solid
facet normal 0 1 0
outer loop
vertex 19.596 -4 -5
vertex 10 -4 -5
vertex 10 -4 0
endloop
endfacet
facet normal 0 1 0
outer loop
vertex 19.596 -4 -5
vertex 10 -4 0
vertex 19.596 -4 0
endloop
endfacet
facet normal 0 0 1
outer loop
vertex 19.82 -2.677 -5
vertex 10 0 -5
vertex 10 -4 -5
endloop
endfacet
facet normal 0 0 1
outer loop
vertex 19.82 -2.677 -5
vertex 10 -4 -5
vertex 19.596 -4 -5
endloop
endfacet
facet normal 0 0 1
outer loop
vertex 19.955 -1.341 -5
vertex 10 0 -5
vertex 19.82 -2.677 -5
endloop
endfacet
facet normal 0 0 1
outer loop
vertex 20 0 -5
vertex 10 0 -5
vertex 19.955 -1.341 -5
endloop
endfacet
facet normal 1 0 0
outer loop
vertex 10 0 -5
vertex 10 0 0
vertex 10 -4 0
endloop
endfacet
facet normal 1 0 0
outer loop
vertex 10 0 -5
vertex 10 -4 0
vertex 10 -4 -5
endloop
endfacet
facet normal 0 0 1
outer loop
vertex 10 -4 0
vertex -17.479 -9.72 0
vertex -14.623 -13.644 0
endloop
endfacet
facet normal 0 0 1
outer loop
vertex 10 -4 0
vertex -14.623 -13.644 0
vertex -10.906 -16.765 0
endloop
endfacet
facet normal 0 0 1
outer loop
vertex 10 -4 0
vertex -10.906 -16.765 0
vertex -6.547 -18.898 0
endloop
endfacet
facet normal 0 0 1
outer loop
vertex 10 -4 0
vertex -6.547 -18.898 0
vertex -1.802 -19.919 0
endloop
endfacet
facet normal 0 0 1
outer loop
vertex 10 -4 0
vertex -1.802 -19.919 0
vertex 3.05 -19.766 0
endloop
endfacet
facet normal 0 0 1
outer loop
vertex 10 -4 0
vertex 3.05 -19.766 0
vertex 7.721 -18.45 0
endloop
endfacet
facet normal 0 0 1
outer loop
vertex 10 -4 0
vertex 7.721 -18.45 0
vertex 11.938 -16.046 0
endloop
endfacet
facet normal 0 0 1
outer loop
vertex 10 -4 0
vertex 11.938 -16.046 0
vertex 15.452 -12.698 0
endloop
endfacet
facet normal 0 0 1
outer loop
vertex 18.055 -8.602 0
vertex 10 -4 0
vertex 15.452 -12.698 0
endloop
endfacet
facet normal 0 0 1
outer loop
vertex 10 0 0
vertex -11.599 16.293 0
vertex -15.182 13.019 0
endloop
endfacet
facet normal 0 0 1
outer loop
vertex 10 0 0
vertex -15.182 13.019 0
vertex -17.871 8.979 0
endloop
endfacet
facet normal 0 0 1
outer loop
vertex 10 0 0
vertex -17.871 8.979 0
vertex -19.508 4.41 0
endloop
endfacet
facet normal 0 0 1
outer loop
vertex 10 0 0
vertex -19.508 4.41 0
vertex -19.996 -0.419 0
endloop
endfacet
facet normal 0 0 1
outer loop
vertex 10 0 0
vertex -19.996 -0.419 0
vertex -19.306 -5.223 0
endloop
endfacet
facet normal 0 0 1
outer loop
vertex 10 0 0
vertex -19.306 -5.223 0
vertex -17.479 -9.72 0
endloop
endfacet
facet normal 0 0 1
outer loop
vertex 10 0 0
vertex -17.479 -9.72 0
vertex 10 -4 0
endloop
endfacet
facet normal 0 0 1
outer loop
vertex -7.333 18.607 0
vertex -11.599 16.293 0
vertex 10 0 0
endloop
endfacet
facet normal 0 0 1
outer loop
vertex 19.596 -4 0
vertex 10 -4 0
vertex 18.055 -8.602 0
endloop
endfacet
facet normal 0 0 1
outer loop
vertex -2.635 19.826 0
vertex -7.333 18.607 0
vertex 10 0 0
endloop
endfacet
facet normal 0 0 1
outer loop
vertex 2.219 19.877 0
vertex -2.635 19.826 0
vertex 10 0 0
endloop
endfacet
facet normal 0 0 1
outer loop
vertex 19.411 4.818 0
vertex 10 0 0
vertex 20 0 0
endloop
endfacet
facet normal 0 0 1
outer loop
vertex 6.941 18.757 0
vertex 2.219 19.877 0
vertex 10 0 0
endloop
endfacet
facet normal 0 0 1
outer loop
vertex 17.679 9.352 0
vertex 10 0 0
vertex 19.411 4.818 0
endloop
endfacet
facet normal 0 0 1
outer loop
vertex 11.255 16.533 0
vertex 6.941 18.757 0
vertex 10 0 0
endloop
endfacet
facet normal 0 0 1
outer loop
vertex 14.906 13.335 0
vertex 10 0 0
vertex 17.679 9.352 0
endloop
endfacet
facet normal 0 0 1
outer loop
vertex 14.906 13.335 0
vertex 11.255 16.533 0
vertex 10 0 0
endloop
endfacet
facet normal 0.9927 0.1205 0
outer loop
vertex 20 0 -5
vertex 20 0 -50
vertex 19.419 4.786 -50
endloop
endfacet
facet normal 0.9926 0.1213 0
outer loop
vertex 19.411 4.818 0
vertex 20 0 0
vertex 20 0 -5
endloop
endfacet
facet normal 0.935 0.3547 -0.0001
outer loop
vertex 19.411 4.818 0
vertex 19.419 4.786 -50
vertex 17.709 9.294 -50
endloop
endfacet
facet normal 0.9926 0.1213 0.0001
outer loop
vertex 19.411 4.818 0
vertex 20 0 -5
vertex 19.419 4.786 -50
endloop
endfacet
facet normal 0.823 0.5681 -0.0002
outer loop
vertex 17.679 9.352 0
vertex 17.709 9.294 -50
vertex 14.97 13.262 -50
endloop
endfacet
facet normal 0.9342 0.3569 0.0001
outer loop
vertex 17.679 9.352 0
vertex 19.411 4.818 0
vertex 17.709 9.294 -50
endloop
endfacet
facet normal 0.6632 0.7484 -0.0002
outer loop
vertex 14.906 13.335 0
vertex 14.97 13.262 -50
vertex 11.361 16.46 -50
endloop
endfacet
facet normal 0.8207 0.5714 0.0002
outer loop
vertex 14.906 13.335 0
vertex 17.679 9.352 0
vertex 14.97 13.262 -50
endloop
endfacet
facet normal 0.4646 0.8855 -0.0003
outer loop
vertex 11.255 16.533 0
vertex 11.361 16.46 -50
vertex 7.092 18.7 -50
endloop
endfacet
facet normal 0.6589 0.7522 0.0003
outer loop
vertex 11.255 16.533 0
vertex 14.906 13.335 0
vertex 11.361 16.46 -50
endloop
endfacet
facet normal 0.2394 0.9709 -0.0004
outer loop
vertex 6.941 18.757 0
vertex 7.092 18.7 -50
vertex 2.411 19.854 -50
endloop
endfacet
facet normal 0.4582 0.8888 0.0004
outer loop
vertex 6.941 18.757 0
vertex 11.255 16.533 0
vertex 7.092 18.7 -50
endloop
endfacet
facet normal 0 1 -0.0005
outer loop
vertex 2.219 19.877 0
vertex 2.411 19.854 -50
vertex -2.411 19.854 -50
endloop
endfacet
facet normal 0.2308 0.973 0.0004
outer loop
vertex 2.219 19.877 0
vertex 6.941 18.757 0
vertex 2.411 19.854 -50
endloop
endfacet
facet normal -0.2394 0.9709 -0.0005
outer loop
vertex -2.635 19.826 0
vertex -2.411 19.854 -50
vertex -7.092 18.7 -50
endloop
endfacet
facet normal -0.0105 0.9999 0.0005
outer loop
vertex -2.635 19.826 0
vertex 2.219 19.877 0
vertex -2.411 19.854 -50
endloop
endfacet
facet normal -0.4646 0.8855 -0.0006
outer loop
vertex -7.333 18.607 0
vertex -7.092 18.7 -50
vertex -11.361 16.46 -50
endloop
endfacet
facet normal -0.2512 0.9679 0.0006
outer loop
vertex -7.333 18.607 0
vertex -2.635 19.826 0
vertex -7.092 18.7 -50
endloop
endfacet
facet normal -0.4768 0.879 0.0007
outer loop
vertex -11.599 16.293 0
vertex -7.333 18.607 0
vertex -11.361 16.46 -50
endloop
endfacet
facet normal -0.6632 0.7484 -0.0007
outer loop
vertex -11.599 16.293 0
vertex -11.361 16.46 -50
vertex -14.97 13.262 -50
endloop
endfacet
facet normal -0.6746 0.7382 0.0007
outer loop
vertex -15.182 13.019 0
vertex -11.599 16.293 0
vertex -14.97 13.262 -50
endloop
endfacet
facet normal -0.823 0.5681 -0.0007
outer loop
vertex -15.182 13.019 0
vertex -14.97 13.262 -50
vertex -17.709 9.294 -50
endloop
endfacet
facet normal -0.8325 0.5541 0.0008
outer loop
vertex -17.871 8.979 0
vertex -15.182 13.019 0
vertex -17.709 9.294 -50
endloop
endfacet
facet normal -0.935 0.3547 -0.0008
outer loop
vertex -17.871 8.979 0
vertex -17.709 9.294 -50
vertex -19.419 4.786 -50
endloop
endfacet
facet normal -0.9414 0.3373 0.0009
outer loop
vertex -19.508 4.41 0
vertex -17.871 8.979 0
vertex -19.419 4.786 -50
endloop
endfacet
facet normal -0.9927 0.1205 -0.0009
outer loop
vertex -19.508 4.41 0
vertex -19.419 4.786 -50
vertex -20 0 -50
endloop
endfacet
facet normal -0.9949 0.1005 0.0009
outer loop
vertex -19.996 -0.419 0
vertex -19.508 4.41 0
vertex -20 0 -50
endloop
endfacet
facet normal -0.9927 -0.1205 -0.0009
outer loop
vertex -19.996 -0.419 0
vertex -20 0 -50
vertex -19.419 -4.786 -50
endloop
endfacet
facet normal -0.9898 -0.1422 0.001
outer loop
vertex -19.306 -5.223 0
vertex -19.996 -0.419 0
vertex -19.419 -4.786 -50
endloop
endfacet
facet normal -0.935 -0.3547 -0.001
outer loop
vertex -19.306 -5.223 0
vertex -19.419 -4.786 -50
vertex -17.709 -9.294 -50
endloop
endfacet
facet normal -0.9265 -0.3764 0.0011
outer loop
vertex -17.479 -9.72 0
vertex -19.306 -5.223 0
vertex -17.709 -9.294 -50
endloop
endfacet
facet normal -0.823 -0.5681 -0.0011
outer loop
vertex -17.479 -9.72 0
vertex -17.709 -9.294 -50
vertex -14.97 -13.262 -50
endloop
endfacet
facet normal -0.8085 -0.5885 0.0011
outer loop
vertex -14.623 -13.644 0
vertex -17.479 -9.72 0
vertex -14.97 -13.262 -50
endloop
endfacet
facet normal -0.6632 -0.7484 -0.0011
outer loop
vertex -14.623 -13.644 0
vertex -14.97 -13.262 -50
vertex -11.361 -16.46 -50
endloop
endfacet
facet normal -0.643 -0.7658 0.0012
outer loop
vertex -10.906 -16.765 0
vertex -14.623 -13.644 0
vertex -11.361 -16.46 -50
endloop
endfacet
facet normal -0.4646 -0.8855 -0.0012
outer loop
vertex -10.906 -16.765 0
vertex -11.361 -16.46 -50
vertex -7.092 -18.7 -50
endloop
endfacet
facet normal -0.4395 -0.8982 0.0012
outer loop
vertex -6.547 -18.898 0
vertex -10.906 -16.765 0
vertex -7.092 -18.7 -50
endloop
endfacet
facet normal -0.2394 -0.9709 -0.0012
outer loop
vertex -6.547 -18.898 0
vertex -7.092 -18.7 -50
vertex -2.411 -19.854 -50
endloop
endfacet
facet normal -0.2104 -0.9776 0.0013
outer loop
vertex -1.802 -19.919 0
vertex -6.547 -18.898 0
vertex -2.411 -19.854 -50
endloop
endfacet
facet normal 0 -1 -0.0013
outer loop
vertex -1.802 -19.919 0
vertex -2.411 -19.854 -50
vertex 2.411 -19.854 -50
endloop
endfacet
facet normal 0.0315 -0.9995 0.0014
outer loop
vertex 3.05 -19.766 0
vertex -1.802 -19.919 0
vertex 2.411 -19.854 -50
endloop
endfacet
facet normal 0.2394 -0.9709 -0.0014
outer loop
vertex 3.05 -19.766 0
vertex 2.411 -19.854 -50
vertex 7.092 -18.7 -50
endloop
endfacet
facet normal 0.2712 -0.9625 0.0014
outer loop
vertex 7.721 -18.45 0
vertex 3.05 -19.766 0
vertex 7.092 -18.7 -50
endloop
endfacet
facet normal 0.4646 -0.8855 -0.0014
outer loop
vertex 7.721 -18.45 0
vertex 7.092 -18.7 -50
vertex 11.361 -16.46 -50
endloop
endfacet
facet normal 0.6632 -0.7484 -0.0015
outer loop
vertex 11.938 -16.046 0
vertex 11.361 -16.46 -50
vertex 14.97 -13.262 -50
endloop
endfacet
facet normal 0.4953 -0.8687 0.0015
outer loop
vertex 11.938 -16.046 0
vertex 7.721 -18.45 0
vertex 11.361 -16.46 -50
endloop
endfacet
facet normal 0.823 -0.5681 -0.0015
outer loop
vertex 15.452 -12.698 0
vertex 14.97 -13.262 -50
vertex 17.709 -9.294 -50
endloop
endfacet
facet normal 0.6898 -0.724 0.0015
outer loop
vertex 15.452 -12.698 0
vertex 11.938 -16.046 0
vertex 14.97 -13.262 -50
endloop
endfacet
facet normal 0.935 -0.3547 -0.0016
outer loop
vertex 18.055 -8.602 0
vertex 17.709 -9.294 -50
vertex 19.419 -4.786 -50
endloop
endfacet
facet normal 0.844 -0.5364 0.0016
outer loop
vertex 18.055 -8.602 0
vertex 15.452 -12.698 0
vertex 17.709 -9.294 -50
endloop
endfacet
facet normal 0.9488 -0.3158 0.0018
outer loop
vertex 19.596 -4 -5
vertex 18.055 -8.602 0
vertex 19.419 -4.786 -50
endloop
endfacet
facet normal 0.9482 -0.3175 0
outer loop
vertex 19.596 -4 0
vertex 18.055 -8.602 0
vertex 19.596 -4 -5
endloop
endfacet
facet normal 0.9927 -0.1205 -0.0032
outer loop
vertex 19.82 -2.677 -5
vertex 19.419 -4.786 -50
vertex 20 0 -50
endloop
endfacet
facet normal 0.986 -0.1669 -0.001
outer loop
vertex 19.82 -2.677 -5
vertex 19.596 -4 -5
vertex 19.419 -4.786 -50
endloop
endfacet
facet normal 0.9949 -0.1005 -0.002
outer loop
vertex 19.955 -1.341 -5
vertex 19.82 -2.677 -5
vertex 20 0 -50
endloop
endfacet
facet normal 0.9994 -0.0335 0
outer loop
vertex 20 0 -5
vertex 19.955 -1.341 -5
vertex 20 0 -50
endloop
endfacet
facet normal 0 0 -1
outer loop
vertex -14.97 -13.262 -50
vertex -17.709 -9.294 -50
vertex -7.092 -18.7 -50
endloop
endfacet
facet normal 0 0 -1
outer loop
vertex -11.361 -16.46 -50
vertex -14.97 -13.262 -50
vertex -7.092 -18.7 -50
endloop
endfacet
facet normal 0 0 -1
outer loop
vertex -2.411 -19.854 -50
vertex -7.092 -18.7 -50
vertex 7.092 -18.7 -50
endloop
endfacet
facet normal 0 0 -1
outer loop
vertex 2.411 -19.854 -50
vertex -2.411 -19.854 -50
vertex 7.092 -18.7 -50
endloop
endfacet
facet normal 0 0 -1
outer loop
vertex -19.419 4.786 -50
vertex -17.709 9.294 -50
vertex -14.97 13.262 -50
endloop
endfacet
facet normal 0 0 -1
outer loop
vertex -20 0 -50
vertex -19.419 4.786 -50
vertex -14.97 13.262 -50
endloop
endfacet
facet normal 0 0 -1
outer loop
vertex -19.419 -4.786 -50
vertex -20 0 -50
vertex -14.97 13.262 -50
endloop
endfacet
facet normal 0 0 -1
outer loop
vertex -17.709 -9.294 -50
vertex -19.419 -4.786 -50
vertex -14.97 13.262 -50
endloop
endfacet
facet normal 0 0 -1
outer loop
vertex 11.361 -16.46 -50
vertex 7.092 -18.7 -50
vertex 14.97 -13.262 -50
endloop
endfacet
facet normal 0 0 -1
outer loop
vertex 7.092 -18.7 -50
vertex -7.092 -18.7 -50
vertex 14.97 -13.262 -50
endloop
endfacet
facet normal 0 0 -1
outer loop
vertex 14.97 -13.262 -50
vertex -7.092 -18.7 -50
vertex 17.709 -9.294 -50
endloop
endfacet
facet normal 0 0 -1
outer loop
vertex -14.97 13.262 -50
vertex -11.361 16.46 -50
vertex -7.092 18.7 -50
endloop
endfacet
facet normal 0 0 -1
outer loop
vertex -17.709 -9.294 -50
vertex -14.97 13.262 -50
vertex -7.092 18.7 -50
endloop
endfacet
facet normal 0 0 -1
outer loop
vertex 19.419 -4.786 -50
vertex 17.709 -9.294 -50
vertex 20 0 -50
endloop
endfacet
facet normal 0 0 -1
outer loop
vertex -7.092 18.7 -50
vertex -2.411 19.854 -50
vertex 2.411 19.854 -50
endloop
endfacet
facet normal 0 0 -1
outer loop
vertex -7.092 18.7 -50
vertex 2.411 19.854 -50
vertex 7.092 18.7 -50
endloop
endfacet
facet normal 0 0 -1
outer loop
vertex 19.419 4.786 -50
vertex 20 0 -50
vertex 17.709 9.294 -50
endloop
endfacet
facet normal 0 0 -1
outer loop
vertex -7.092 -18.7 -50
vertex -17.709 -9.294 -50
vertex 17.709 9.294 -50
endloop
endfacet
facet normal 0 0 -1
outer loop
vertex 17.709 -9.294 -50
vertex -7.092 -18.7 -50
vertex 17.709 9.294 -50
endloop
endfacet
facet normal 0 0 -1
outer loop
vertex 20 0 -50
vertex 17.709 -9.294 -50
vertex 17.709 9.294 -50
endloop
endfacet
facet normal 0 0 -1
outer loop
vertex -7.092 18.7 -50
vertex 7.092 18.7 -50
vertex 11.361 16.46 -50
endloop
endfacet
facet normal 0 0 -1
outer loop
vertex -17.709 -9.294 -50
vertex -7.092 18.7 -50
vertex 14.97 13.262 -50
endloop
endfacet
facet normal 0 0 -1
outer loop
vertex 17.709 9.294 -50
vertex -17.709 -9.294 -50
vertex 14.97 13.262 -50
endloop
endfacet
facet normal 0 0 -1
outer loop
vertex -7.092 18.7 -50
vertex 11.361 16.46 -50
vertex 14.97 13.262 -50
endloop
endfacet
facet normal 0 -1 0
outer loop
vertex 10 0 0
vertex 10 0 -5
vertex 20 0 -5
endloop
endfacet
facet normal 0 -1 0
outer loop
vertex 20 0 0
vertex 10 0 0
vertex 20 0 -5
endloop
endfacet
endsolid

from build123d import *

# Parameters (mm, degrees)
SKETCH_1_R          = 20
EXTRUDE_1_DEPTH     = 50
SKETCH_2_W          = 30
SKETCH_2_H          = 10
CUT_EXTRUDE_1_DEPTH = 4


with BuildPart() as part:
    # 草图1 → 凸台-拉伸1 (new body)
    with BuildSketch(Plane.XY):
        Circle(SKETCH_1_R)
    extrude(amount=-EXTRUDE_1_DEPTH)

    # 草图2 → 切除-拉伸1 (cut)
    with BuildSketch(Plane(origin=(0, 0, 0), x_dir=(1, 0, 0), z_dir=(0, 1, 0))):
        with Locations((25, 0)):
            Rectangle(SKETCH_2_W, SKETCH_2_H)
    extrude(amount=-CUT_EXTRUDE_1_DEPTH, mode=Mode.SUBTRACT)


solid = part.part
